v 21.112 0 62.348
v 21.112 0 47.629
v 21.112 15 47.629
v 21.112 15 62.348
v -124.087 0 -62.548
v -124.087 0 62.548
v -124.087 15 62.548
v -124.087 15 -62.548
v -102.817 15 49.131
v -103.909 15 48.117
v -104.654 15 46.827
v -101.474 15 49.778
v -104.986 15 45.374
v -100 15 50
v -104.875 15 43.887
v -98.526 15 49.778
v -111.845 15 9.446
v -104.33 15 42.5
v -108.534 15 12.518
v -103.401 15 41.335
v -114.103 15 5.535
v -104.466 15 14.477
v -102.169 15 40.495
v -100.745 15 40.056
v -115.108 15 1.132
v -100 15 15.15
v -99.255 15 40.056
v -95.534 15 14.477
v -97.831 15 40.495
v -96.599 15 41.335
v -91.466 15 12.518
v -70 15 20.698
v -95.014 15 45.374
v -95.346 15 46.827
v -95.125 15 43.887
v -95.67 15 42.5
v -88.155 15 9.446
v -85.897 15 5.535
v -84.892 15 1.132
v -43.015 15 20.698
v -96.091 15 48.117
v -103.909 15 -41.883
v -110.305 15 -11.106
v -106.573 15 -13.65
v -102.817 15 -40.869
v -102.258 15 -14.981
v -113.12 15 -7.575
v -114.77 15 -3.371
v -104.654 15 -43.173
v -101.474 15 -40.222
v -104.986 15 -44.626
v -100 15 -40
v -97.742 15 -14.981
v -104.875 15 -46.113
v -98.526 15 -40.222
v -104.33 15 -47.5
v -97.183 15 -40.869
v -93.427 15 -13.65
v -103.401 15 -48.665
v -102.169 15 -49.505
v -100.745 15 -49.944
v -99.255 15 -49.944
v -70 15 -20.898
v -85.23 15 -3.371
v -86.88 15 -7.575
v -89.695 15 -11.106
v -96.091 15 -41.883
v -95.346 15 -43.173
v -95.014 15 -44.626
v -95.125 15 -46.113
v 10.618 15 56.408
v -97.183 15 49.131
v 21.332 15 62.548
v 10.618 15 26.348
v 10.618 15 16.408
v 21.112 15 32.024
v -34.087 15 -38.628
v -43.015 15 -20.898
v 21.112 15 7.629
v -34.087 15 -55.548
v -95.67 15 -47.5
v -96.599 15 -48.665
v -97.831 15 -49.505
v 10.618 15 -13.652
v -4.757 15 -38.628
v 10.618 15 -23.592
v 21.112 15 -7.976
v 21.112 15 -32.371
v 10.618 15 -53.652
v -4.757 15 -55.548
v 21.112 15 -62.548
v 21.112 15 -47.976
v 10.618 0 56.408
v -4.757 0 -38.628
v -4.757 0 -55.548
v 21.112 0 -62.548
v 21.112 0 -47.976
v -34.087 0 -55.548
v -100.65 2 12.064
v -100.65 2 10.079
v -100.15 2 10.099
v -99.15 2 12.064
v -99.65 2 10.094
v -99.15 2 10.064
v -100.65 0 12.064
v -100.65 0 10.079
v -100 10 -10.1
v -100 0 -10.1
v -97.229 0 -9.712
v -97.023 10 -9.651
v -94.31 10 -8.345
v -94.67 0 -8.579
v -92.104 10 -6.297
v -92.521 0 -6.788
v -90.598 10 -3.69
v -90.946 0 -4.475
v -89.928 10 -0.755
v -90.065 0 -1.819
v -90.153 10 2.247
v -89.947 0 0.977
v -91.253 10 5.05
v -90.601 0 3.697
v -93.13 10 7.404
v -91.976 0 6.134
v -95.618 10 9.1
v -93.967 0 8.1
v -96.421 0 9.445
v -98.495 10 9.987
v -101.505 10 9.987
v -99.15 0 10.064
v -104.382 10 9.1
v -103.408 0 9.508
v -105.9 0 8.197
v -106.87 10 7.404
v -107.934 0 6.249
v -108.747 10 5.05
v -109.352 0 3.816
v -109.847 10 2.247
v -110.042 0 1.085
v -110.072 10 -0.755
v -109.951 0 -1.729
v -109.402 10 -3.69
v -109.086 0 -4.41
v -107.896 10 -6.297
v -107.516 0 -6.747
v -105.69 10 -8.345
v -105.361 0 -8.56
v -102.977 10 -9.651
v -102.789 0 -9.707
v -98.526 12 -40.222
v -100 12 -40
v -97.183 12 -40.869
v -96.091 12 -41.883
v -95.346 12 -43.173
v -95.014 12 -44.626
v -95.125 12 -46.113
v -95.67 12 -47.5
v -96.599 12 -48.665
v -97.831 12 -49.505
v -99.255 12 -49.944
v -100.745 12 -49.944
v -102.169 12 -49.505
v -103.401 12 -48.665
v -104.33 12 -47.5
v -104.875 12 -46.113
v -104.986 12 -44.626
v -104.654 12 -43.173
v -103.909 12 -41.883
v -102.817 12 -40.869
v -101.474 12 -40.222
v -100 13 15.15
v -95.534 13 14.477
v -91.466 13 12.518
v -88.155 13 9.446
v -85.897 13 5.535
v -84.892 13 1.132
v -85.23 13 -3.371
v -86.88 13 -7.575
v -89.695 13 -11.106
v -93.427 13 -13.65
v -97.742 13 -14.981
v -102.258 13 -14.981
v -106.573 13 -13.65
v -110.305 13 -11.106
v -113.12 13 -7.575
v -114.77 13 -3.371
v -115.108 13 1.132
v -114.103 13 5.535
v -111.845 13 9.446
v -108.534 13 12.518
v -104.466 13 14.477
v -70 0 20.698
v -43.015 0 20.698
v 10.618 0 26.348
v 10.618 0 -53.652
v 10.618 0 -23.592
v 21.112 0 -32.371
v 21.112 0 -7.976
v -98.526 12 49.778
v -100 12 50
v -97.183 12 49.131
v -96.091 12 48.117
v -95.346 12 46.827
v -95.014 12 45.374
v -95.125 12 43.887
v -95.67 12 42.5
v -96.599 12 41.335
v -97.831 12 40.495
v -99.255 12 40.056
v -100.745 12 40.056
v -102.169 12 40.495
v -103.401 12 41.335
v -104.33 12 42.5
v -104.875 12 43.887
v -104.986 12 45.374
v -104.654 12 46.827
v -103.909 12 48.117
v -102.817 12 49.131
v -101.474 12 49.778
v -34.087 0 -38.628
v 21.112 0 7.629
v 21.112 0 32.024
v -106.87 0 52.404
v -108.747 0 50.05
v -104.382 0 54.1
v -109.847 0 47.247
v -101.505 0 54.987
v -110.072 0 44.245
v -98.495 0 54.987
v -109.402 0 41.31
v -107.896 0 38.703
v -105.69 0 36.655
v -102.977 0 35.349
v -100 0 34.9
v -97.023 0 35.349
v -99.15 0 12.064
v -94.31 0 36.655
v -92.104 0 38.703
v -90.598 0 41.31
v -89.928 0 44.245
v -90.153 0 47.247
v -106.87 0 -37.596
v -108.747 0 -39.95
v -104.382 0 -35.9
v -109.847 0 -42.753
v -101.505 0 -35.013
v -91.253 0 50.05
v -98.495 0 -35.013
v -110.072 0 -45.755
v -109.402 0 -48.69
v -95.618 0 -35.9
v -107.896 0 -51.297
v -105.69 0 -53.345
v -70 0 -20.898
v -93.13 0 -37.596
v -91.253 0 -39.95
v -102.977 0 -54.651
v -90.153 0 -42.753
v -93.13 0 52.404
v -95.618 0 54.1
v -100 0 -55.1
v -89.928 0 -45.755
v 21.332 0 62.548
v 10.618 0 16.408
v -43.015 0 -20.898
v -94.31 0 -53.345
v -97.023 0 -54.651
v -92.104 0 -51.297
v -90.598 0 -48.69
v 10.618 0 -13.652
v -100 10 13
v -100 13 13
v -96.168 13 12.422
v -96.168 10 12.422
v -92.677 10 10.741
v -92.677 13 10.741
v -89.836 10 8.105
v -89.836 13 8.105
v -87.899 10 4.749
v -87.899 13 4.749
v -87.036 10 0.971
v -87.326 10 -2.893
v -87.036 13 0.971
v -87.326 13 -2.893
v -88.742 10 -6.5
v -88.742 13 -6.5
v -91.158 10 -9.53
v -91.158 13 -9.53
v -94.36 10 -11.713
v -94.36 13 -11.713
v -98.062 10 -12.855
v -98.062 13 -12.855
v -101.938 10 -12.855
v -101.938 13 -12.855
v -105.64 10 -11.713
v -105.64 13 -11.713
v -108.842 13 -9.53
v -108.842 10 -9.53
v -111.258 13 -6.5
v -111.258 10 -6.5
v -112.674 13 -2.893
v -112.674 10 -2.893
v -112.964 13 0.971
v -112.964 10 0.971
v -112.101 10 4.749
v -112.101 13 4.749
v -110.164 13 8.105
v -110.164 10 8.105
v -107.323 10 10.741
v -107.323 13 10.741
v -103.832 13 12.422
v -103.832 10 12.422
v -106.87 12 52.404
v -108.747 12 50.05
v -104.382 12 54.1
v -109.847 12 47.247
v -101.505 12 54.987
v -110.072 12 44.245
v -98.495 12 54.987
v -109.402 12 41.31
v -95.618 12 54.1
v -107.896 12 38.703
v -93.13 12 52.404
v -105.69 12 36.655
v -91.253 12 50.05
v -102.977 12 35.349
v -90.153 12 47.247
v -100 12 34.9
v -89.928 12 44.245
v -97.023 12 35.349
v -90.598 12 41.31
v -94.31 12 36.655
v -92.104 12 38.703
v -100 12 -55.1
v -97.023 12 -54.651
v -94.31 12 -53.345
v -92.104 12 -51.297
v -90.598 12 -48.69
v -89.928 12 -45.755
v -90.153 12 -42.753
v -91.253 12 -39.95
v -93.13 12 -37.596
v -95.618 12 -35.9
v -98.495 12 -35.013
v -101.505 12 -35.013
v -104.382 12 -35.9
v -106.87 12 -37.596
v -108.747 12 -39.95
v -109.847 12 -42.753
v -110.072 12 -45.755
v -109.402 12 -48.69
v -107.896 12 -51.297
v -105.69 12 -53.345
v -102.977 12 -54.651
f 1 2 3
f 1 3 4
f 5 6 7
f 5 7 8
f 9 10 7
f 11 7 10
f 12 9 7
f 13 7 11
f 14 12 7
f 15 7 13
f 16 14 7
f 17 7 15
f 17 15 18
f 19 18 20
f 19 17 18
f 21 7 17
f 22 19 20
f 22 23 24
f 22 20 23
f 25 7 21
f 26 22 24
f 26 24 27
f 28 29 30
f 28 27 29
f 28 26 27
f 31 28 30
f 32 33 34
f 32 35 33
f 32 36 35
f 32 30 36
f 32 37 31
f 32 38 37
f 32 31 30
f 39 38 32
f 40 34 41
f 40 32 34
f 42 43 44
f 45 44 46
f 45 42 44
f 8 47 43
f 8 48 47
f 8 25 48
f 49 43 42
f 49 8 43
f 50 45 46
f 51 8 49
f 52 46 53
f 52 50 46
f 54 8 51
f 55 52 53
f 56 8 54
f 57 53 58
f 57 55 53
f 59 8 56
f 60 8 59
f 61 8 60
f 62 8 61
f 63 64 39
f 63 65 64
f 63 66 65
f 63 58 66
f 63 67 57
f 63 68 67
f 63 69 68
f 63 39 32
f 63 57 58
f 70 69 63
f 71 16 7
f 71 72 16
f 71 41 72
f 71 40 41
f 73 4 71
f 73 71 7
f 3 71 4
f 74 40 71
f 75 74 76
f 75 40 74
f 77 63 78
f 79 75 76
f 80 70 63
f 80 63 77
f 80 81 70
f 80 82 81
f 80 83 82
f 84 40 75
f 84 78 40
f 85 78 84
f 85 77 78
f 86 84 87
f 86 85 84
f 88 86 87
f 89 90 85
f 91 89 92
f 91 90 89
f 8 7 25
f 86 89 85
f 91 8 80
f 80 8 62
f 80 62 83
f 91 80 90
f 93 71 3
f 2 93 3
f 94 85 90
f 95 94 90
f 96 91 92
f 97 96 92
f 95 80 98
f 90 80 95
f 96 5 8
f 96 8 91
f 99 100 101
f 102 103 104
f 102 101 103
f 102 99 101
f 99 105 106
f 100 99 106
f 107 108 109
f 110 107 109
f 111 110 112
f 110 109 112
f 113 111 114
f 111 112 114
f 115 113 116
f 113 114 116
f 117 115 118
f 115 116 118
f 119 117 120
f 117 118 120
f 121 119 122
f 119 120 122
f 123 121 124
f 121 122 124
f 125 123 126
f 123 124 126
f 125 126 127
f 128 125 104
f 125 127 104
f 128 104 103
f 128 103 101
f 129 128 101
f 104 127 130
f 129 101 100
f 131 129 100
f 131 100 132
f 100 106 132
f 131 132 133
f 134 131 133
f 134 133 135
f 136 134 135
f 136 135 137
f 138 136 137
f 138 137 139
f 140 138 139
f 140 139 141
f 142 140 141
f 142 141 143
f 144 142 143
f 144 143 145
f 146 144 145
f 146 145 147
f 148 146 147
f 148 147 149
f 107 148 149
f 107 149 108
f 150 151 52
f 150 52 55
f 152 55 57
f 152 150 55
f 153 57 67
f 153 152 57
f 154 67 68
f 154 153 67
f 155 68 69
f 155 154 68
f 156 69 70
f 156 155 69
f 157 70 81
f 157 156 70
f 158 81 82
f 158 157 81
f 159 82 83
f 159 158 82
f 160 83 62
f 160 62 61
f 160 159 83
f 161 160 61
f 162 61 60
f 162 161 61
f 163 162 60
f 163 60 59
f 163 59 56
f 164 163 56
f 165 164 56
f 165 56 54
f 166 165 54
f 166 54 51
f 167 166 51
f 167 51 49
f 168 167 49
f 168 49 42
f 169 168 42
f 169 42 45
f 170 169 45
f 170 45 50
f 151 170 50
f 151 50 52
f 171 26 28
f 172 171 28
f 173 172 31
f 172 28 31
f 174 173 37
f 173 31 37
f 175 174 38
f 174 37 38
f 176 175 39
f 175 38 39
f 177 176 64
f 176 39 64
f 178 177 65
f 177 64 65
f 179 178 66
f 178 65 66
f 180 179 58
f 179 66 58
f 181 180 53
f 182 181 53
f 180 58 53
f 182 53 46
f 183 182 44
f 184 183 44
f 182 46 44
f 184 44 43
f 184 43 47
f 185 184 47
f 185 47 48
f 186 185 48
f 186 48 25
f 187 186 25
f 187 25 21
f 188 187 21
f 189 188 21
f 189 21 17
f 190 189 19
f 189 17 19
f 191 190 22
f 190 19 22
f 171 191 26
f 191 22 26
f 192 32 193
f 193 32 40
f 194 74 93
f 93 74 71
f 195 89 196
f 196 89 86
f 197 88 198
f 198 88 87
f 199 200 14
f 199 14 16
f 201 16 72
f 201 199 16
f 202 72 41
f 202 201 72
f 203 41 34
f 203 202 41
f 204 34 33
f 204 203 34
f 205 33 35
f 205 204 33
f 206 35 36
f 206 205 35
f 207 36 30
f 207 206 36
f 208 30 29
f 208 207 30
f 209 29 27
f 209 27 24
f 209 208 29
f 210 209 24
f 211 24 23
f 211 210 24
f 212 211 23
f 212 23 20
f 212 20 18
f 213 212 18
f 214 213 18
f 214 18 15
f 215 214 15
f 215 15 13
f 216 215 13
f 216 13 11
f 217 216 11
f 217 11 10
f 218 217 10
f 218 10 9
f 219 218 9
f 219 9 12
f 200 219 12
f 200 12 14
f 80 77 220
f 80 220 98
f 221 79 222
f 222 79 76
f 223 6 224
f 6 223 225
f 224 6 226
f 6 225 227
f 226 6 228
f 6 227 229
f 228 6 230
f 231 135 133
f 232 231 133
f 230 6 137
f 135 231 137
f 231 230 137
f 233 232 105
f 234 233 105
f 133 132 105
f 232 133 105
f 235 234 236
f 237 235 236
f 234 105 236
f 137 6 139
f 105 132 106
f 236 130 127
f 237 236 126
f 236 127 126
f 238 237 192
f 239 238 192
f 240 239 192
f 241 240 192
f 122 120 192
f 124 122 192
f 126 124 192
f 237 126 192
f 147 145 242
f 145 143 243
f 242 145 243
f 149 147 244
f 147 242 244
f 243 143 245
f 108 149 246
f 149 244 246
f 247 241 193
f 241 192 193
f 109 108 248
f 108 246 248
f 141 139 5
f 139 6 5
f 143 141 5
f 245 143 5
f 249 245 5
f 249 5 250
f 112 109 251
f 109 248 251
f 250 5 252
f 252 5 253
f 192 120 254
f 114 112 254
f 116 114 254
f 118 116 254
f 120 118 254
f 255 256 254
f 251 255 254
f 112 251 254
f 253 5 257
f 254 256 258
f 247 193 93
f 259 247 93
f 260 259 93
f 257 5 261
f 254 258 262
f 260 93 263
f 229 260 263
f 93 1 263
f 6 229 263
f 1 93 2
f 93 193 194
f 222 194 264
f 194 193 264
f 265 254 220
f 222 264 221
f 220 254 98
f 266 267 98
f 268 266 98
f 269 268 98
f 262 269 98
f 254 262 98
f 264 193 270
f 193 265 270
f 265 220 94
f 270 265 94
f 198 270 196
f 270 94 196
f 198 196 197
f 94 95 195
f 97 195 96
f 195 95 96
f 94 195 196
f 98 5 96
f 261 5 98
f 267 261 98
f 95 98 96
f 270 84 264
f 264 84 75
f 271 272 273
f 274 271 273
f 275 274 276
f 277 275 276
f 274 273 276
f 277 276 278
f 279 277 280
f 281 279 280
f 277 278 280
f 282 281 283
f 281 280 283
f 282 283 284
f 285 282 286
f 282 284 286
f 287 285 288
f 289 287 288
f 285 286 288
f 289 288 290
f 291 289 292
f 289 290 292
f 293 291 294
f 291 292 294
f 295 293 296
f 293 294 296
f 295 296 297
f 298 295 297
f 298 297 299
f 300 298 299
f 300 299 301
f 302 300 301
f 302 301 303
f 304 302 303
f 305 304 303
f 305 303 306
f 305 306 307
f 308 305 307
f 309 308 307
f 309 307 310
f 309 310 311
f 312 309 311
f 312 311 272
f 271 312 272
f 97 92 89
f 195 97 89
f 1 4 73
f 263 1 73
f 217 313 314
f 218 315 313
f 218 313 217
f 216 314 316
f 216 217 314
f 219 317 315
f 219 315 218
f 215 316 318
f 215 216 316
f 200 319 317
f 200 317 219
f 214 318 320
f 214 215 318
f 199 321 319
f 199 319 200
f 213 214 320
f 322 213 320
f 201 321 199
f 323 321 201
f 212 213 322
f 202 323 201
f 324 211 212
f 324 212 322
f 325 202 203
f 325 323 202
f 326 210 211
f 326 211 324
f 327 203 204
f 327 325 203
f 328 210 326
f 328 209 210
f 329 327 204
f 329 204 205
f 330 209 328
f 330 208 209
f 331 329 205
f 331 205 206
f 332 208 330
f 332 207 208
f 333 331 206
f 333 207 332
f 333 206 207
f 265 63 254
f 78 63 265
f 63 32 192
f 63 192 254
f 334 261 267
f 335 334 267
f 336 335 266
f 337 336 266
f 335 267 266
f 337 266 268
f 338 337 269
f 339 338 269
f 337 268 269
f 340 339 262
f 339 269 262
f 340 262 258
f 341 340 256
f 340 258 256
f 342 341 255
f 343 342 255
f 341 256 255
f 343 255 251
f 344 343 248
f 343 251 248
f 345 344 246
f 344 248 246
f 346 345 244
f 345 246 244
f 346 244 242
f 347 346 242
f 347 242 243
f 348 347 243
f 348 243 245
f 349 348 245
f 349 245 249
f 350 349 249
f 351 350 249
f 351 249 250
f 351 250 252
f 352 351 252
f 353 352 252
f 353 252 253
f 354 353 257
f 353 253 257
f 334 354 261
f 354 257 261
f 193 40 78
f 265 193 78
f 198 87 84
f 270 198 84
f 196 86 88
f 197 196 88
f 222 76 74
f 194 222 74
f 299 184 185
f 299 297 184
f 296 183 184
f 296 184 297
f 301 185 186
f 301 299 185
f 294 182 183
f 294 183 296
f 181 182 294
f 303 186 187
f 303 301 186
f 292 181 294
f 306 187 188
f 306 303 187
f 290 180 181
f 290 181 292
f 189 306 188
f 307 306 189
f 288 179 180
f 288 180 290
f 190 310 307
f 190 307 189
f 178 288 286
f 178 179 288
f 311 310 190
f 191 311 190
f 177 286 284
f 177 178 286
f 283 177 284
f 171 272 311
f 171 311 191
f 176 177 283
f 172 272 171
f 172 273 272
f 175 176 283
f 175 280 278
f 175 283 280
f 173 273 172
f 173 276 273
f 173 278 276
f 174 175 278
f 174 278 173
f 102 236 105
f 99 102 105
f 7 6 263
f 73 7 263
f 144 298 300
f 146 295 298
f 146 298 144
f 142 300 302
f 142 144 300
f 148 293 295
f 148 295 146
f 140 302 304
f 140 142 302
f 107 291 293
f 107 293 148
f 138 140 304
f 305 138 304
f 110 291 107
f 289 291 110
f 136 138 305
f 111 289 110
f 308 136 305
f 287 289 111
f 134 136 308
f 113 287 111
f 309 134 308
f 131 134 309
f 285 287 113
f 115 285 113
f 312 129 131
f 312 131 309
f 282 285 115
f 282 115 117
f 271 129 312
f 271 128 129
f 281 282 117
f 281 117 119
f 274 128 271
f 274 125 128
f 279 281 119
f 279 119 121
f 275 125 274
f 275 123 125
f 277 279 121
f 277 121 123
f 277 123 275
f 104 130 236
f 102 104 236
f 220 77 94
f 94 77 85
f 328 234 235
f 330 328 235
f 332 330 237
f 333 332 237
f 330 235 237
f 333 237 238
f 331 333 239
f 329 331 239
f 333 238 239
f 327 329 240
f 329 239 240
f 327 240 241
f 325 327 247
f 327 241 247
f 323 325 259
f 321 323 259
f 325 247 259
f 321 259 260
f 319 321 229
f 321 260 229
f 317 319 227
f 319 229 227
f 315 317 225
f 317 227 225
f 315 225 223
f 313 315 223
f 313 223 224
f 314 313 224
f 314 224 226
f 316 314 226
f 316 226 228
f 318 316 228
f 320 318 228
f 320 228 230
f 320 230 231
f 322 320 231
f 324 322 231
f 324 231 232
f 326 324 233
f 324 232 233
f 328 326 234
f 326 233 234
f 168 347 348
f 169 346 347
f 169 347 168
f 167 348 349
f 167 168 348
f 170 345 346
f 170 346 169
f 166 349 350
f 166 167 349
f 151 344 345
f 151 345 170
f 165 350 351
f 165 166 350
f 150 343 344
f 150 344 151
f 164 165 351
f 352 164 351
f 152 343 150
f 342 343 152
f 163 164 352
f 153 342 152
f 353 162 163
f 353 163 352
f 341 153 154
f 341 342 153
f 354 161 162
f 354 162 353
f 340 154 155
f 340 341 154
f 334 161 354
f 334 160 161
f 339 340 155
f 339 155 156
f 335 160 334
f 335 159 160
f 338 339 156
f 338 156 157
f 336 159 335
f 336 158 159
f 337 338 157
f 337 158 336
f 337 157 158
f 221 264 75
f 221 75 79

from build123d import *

# Parameters (mm, degrees)
SKETCH1_W           = 280
SKETCH1_H           = 210
BOSS_EXTRUDE1_DEPTH = 15
SKETCH2_R           = 5
BOSS_EXTRUDE2_DEPTH = 50
SKETCH3_W           = 10
SKETCH3_H           = 30
BOSS_EXTRUDE3_DEPTH = 50
SKETCH4_R           = 13
CUT_EXTRUDE1_DEPTH  = 20
SKETCH5_W           = 360.4909063
SKETCH5_H           = 249.182613404
SKETCH5_W_2         = 248.173776912
SKETCH5_H_2         = 125.095724948
CUT_EXTRUDE5_DEPTH  = 15
CUT_EXTRUDE6_START  = -65
SKETCH7_R           = 5
CUT_EXTRUDE6_DEPTH  = 65
SKETCH8_R           = 10.1
CUT_EXTRUDE11_DEPTH = 12
SKETCH13_W          = 26.98462743
SKETCH13_H          = 41.59552633
CUT_EXTRUDE12_DEPTH = 148.681383345
SKETCH11_W          = 17.231524428
SKETCH11_H          = 37.334969593
CUT_EXTRUDE13_DEPTH = 50
CUT_EXTRUDE16_DEPTH = 140.766916639
SKETCH16_R          = 13
CUT_EXTRUDE20_DEPTH = 5
CUT_EXTRUDE22_DEPTH = 2
SKETCH18_R          = 15.15
CUT_EXTRUDE23_DEPTH = 2
SKETCH9_W           = 29.33
SKETCH9_H           = 16.92
CUT_EXTRUDE24_DEPTH = 140.766916639


with BuildPart() as part:
    # Sketch1 → Boss-Extrude1 (new body)
    with BuildSketch(Plane(origin=(0, 0, 0), x_dir=(1, 0, 0), z_dir=(0, 1, 0))):
        Rectangle(SKETCH1_W, SKETCH1_H)
    extrude(amount=BOSS_EXTRUDE1_DEPTH)

    # Sketch2 → Boss-Extrude2 (add)
    with BuildSketch(Plane(origin=(0, 15, 0), x_dir=(1, 0, 0), z_dir=(0, 1, 0))):
        with Locations(Location((-100, 0, 0), (0, 0, 270))):
            Circle(SKETCH2_R)
        with Locations(Location((-100, 45, 0), (0, 0, 270))):
            Circle(SKETCH2_R)
        with Locations(Location((-100, -45, 0), (0, 0, 270))):
            Circle(SKETCH2_R)
    extrude(amount=BOSS_EXTRUDE2_DEPTH)

    # Sketch3 → Boss-Extrude3 (add)
    with BuildSketch(Plane(origin=(0, 15, 0), x_dir=(1, 0, 0), z_dir=(0, 1, 0))):
        Rectangle(SKETCH3_W, SKETCH3_H)
    extrude(amount=BOSS_EXTRUDE3_DEPTH)

    # Sketch4 → Cut-Extrude1 (cut)
    with BuildSketch(Plane(origin=(5, 0, 0), x_dir=(0, 0, -1), z_dir=(1, 0, 0))):
        with Locations((0, 41.236240869)):
            Circle(SKETCH4_R)
    extrude(amount=-CUT_EXTRUDE1_DEPTH, mode=Mode.SUBTRACT)

    # Sketch5 → Cut-Extrude5 (cut)
    with BuildSketch(Plane(origin=(0, 0, 0), x_dir=(1, 0, 0), z_dir=(0, 1, 0))):
        with Locations((1.345115322, -3.19464889)):
            Rectangle(SKETCH5_W, SKETCH5_H)
        Rectangle(SKETCH5_W_2, SKETCH5_H_2, mode=Mode.SUBTRACT)
    extrude(amount=CUT_EXTRUDE5_DEPTH, mode=Mode.SUBTRACT)

    # Sketch7 → Cut-Extrude6 (cut)
    with BuildSketch(Plane(origin=(0, 65, 0), x_dir=(1, 0, 0), z_dir=(0, 1, 0)).offset(CUT_EXTRUDE6_START)):
        with Locations(Location((-100, 45, 0), (0, 0, 270))):
            Circle(SKETCH7_R)
        with Locations(Location((-100, 0, 0), (0, 0, 270))):
            Circle(SKETCH7_R)
        with Locations(Location((-100, -45, 0), (0, 0, 270))):
            Circle(SKETCH7_R)
    extrude(amount=CUT_EXTRUDE6_DEPTH, mode=Mode.SUBTRACT)

    # Sketch8 → Cut-Extrude11 (cut)
    with BuildSketch(Plane.XZ):
        with Locations(Location((-100, 45, 0), (0, 0, 270))):
            Circle(SKETCH8_R)
        with Locations(Location((-100, 0, 0), (0, 0, 270))):
            Circle(SKETCH8_R)
        with Locations(Location((-100, -45, 0), (0, 0, 270))):
            Circle(SKETCH8_R)
    extrude(amount=-CUT_EXTRUDE11_DEPTH, mode=Mode.SUBTRACT)

    # Sketch13 → Cut-Extrude12 (cut, through all)
    with BuildSketch(Plane(origin=(0, 15, 0), x_dir=(1, 0, 0), z_dir=(0, 1, 0))):
        with Locations((-56.507686285, 0.099999998)):
            Rectangle(SKETCH13_W, SKETCH13_H)
    extrude(amount=-CUT_EXTRUDE12_DEPTH, mode=Mode.SUBTRACT)

    # Sketch11 → Cut-Extrude13 (cut)
    with BuildSketch(Plane(origin=(0, 65, 0), x_dir=(1, 0, 0), z_dir=(0, 1, 0))):
        with Locations((-3.002833284, 0.13632265)):
            Rectangle(SKETCH11_W, SKETCH11_H)
    extrude(amount=-CUT_EXTRUDE13_DEPTH, mode=Mode.SUBTRACT)

    # Sketch10 → Cut-Extrude16 (cut, through all)
    with BuildSketch(Plane(origin=(0, 15, 0), x_dir=(1, 0, 0), z_dir=(0, 1, 0))):
        Polygon((10.617962241, 13.651558309), (10.617962241, -16.40773575), (21.11227659, -7.629229077), (21.11227659, -32.023722987), (10.617962241, -26.348441691), (10.617962241, -56.40773575), (21.11227659, -47.629229077), (21.11227659, -62.347862477), (41.181983769, -80.61345612), (118.859305744, -85.146591928), (147.57727439, -51.586107965), (147.57727439, 65.118065893), (115.028872781, 75.532398006), (21.11227659, 80.76325418), (21.11227659, 62.347862473), (21.11227659, 47.976277013), (10.617962241, 53.651558309), (10.617962241, 23.59226425), (21.11227659, 32.370770923), (21.11227659, 7.976277013), align=None)
    extrude(amount=-CUT_EXTRUDE16_DEPTH, mode=Mode.SUBTRACT)

    # Sketch16 → Cut-Extrude20 (cut)
    with BuildSketch(Plane(origin=(0, 15, 0), x_dir=(1, 0, 0), z_dir=(0, 1, 0))):
        with Locations(Location((-100, 0, 0), (0, 0, 270))):
            Circle(SKETCH16_R)
    extrude(amount=-CUT_EXTRUDE20_DEPTH, mode=Mode.SUBTRACT)

    # Sketch17 → Cut-Extrude22 (cut)
    with BuildSketch(Plane.XZ):
        Polygon((-99.150124323, 10.064179616), (-99.150124323, 12.064179616), (-100.650124323, 12.064179616), (-100.650124323, 10.064179616), (-100.726397945, 9.213176312), (-99.150124323, 9.422776077), align=None)
    extrude(amount=-CUT_EXTRUDE22_DEPTH, mode=Mode.SUBTRACT)

    # Sketch18 → Cut-Extrude23 (cut)
    with BuildSketch(Plane(origin=(0, 15, 0), x_dir=(1, 0, 0), z_dir=(0, 1, 0))):
        with Locations(Location((-100, 0, 0), (0, 0, 270))):
            Circle(SKETCH18_R)
    extrude(amount=-CUT_EXTRUDE23_DEPTH, mode=Mode.SUBTRACT)

    # Sketch9 → Cut-Extrude24 (cut, through all)
    with BuildSketch(Plane(origin=(0, 15, 0), x_dir=(1, 0, 0), z_dir=(0, 1, 0))):
        with Locations((-19.421888456, 47.087862474)):
            Rectangle(SKETCH9_W, SKETCH9_H)
    extrude(amount=-CUT_EXTRUDE24_DEPTH, mode=Mode.SUBTRACT)


solid = part.part
